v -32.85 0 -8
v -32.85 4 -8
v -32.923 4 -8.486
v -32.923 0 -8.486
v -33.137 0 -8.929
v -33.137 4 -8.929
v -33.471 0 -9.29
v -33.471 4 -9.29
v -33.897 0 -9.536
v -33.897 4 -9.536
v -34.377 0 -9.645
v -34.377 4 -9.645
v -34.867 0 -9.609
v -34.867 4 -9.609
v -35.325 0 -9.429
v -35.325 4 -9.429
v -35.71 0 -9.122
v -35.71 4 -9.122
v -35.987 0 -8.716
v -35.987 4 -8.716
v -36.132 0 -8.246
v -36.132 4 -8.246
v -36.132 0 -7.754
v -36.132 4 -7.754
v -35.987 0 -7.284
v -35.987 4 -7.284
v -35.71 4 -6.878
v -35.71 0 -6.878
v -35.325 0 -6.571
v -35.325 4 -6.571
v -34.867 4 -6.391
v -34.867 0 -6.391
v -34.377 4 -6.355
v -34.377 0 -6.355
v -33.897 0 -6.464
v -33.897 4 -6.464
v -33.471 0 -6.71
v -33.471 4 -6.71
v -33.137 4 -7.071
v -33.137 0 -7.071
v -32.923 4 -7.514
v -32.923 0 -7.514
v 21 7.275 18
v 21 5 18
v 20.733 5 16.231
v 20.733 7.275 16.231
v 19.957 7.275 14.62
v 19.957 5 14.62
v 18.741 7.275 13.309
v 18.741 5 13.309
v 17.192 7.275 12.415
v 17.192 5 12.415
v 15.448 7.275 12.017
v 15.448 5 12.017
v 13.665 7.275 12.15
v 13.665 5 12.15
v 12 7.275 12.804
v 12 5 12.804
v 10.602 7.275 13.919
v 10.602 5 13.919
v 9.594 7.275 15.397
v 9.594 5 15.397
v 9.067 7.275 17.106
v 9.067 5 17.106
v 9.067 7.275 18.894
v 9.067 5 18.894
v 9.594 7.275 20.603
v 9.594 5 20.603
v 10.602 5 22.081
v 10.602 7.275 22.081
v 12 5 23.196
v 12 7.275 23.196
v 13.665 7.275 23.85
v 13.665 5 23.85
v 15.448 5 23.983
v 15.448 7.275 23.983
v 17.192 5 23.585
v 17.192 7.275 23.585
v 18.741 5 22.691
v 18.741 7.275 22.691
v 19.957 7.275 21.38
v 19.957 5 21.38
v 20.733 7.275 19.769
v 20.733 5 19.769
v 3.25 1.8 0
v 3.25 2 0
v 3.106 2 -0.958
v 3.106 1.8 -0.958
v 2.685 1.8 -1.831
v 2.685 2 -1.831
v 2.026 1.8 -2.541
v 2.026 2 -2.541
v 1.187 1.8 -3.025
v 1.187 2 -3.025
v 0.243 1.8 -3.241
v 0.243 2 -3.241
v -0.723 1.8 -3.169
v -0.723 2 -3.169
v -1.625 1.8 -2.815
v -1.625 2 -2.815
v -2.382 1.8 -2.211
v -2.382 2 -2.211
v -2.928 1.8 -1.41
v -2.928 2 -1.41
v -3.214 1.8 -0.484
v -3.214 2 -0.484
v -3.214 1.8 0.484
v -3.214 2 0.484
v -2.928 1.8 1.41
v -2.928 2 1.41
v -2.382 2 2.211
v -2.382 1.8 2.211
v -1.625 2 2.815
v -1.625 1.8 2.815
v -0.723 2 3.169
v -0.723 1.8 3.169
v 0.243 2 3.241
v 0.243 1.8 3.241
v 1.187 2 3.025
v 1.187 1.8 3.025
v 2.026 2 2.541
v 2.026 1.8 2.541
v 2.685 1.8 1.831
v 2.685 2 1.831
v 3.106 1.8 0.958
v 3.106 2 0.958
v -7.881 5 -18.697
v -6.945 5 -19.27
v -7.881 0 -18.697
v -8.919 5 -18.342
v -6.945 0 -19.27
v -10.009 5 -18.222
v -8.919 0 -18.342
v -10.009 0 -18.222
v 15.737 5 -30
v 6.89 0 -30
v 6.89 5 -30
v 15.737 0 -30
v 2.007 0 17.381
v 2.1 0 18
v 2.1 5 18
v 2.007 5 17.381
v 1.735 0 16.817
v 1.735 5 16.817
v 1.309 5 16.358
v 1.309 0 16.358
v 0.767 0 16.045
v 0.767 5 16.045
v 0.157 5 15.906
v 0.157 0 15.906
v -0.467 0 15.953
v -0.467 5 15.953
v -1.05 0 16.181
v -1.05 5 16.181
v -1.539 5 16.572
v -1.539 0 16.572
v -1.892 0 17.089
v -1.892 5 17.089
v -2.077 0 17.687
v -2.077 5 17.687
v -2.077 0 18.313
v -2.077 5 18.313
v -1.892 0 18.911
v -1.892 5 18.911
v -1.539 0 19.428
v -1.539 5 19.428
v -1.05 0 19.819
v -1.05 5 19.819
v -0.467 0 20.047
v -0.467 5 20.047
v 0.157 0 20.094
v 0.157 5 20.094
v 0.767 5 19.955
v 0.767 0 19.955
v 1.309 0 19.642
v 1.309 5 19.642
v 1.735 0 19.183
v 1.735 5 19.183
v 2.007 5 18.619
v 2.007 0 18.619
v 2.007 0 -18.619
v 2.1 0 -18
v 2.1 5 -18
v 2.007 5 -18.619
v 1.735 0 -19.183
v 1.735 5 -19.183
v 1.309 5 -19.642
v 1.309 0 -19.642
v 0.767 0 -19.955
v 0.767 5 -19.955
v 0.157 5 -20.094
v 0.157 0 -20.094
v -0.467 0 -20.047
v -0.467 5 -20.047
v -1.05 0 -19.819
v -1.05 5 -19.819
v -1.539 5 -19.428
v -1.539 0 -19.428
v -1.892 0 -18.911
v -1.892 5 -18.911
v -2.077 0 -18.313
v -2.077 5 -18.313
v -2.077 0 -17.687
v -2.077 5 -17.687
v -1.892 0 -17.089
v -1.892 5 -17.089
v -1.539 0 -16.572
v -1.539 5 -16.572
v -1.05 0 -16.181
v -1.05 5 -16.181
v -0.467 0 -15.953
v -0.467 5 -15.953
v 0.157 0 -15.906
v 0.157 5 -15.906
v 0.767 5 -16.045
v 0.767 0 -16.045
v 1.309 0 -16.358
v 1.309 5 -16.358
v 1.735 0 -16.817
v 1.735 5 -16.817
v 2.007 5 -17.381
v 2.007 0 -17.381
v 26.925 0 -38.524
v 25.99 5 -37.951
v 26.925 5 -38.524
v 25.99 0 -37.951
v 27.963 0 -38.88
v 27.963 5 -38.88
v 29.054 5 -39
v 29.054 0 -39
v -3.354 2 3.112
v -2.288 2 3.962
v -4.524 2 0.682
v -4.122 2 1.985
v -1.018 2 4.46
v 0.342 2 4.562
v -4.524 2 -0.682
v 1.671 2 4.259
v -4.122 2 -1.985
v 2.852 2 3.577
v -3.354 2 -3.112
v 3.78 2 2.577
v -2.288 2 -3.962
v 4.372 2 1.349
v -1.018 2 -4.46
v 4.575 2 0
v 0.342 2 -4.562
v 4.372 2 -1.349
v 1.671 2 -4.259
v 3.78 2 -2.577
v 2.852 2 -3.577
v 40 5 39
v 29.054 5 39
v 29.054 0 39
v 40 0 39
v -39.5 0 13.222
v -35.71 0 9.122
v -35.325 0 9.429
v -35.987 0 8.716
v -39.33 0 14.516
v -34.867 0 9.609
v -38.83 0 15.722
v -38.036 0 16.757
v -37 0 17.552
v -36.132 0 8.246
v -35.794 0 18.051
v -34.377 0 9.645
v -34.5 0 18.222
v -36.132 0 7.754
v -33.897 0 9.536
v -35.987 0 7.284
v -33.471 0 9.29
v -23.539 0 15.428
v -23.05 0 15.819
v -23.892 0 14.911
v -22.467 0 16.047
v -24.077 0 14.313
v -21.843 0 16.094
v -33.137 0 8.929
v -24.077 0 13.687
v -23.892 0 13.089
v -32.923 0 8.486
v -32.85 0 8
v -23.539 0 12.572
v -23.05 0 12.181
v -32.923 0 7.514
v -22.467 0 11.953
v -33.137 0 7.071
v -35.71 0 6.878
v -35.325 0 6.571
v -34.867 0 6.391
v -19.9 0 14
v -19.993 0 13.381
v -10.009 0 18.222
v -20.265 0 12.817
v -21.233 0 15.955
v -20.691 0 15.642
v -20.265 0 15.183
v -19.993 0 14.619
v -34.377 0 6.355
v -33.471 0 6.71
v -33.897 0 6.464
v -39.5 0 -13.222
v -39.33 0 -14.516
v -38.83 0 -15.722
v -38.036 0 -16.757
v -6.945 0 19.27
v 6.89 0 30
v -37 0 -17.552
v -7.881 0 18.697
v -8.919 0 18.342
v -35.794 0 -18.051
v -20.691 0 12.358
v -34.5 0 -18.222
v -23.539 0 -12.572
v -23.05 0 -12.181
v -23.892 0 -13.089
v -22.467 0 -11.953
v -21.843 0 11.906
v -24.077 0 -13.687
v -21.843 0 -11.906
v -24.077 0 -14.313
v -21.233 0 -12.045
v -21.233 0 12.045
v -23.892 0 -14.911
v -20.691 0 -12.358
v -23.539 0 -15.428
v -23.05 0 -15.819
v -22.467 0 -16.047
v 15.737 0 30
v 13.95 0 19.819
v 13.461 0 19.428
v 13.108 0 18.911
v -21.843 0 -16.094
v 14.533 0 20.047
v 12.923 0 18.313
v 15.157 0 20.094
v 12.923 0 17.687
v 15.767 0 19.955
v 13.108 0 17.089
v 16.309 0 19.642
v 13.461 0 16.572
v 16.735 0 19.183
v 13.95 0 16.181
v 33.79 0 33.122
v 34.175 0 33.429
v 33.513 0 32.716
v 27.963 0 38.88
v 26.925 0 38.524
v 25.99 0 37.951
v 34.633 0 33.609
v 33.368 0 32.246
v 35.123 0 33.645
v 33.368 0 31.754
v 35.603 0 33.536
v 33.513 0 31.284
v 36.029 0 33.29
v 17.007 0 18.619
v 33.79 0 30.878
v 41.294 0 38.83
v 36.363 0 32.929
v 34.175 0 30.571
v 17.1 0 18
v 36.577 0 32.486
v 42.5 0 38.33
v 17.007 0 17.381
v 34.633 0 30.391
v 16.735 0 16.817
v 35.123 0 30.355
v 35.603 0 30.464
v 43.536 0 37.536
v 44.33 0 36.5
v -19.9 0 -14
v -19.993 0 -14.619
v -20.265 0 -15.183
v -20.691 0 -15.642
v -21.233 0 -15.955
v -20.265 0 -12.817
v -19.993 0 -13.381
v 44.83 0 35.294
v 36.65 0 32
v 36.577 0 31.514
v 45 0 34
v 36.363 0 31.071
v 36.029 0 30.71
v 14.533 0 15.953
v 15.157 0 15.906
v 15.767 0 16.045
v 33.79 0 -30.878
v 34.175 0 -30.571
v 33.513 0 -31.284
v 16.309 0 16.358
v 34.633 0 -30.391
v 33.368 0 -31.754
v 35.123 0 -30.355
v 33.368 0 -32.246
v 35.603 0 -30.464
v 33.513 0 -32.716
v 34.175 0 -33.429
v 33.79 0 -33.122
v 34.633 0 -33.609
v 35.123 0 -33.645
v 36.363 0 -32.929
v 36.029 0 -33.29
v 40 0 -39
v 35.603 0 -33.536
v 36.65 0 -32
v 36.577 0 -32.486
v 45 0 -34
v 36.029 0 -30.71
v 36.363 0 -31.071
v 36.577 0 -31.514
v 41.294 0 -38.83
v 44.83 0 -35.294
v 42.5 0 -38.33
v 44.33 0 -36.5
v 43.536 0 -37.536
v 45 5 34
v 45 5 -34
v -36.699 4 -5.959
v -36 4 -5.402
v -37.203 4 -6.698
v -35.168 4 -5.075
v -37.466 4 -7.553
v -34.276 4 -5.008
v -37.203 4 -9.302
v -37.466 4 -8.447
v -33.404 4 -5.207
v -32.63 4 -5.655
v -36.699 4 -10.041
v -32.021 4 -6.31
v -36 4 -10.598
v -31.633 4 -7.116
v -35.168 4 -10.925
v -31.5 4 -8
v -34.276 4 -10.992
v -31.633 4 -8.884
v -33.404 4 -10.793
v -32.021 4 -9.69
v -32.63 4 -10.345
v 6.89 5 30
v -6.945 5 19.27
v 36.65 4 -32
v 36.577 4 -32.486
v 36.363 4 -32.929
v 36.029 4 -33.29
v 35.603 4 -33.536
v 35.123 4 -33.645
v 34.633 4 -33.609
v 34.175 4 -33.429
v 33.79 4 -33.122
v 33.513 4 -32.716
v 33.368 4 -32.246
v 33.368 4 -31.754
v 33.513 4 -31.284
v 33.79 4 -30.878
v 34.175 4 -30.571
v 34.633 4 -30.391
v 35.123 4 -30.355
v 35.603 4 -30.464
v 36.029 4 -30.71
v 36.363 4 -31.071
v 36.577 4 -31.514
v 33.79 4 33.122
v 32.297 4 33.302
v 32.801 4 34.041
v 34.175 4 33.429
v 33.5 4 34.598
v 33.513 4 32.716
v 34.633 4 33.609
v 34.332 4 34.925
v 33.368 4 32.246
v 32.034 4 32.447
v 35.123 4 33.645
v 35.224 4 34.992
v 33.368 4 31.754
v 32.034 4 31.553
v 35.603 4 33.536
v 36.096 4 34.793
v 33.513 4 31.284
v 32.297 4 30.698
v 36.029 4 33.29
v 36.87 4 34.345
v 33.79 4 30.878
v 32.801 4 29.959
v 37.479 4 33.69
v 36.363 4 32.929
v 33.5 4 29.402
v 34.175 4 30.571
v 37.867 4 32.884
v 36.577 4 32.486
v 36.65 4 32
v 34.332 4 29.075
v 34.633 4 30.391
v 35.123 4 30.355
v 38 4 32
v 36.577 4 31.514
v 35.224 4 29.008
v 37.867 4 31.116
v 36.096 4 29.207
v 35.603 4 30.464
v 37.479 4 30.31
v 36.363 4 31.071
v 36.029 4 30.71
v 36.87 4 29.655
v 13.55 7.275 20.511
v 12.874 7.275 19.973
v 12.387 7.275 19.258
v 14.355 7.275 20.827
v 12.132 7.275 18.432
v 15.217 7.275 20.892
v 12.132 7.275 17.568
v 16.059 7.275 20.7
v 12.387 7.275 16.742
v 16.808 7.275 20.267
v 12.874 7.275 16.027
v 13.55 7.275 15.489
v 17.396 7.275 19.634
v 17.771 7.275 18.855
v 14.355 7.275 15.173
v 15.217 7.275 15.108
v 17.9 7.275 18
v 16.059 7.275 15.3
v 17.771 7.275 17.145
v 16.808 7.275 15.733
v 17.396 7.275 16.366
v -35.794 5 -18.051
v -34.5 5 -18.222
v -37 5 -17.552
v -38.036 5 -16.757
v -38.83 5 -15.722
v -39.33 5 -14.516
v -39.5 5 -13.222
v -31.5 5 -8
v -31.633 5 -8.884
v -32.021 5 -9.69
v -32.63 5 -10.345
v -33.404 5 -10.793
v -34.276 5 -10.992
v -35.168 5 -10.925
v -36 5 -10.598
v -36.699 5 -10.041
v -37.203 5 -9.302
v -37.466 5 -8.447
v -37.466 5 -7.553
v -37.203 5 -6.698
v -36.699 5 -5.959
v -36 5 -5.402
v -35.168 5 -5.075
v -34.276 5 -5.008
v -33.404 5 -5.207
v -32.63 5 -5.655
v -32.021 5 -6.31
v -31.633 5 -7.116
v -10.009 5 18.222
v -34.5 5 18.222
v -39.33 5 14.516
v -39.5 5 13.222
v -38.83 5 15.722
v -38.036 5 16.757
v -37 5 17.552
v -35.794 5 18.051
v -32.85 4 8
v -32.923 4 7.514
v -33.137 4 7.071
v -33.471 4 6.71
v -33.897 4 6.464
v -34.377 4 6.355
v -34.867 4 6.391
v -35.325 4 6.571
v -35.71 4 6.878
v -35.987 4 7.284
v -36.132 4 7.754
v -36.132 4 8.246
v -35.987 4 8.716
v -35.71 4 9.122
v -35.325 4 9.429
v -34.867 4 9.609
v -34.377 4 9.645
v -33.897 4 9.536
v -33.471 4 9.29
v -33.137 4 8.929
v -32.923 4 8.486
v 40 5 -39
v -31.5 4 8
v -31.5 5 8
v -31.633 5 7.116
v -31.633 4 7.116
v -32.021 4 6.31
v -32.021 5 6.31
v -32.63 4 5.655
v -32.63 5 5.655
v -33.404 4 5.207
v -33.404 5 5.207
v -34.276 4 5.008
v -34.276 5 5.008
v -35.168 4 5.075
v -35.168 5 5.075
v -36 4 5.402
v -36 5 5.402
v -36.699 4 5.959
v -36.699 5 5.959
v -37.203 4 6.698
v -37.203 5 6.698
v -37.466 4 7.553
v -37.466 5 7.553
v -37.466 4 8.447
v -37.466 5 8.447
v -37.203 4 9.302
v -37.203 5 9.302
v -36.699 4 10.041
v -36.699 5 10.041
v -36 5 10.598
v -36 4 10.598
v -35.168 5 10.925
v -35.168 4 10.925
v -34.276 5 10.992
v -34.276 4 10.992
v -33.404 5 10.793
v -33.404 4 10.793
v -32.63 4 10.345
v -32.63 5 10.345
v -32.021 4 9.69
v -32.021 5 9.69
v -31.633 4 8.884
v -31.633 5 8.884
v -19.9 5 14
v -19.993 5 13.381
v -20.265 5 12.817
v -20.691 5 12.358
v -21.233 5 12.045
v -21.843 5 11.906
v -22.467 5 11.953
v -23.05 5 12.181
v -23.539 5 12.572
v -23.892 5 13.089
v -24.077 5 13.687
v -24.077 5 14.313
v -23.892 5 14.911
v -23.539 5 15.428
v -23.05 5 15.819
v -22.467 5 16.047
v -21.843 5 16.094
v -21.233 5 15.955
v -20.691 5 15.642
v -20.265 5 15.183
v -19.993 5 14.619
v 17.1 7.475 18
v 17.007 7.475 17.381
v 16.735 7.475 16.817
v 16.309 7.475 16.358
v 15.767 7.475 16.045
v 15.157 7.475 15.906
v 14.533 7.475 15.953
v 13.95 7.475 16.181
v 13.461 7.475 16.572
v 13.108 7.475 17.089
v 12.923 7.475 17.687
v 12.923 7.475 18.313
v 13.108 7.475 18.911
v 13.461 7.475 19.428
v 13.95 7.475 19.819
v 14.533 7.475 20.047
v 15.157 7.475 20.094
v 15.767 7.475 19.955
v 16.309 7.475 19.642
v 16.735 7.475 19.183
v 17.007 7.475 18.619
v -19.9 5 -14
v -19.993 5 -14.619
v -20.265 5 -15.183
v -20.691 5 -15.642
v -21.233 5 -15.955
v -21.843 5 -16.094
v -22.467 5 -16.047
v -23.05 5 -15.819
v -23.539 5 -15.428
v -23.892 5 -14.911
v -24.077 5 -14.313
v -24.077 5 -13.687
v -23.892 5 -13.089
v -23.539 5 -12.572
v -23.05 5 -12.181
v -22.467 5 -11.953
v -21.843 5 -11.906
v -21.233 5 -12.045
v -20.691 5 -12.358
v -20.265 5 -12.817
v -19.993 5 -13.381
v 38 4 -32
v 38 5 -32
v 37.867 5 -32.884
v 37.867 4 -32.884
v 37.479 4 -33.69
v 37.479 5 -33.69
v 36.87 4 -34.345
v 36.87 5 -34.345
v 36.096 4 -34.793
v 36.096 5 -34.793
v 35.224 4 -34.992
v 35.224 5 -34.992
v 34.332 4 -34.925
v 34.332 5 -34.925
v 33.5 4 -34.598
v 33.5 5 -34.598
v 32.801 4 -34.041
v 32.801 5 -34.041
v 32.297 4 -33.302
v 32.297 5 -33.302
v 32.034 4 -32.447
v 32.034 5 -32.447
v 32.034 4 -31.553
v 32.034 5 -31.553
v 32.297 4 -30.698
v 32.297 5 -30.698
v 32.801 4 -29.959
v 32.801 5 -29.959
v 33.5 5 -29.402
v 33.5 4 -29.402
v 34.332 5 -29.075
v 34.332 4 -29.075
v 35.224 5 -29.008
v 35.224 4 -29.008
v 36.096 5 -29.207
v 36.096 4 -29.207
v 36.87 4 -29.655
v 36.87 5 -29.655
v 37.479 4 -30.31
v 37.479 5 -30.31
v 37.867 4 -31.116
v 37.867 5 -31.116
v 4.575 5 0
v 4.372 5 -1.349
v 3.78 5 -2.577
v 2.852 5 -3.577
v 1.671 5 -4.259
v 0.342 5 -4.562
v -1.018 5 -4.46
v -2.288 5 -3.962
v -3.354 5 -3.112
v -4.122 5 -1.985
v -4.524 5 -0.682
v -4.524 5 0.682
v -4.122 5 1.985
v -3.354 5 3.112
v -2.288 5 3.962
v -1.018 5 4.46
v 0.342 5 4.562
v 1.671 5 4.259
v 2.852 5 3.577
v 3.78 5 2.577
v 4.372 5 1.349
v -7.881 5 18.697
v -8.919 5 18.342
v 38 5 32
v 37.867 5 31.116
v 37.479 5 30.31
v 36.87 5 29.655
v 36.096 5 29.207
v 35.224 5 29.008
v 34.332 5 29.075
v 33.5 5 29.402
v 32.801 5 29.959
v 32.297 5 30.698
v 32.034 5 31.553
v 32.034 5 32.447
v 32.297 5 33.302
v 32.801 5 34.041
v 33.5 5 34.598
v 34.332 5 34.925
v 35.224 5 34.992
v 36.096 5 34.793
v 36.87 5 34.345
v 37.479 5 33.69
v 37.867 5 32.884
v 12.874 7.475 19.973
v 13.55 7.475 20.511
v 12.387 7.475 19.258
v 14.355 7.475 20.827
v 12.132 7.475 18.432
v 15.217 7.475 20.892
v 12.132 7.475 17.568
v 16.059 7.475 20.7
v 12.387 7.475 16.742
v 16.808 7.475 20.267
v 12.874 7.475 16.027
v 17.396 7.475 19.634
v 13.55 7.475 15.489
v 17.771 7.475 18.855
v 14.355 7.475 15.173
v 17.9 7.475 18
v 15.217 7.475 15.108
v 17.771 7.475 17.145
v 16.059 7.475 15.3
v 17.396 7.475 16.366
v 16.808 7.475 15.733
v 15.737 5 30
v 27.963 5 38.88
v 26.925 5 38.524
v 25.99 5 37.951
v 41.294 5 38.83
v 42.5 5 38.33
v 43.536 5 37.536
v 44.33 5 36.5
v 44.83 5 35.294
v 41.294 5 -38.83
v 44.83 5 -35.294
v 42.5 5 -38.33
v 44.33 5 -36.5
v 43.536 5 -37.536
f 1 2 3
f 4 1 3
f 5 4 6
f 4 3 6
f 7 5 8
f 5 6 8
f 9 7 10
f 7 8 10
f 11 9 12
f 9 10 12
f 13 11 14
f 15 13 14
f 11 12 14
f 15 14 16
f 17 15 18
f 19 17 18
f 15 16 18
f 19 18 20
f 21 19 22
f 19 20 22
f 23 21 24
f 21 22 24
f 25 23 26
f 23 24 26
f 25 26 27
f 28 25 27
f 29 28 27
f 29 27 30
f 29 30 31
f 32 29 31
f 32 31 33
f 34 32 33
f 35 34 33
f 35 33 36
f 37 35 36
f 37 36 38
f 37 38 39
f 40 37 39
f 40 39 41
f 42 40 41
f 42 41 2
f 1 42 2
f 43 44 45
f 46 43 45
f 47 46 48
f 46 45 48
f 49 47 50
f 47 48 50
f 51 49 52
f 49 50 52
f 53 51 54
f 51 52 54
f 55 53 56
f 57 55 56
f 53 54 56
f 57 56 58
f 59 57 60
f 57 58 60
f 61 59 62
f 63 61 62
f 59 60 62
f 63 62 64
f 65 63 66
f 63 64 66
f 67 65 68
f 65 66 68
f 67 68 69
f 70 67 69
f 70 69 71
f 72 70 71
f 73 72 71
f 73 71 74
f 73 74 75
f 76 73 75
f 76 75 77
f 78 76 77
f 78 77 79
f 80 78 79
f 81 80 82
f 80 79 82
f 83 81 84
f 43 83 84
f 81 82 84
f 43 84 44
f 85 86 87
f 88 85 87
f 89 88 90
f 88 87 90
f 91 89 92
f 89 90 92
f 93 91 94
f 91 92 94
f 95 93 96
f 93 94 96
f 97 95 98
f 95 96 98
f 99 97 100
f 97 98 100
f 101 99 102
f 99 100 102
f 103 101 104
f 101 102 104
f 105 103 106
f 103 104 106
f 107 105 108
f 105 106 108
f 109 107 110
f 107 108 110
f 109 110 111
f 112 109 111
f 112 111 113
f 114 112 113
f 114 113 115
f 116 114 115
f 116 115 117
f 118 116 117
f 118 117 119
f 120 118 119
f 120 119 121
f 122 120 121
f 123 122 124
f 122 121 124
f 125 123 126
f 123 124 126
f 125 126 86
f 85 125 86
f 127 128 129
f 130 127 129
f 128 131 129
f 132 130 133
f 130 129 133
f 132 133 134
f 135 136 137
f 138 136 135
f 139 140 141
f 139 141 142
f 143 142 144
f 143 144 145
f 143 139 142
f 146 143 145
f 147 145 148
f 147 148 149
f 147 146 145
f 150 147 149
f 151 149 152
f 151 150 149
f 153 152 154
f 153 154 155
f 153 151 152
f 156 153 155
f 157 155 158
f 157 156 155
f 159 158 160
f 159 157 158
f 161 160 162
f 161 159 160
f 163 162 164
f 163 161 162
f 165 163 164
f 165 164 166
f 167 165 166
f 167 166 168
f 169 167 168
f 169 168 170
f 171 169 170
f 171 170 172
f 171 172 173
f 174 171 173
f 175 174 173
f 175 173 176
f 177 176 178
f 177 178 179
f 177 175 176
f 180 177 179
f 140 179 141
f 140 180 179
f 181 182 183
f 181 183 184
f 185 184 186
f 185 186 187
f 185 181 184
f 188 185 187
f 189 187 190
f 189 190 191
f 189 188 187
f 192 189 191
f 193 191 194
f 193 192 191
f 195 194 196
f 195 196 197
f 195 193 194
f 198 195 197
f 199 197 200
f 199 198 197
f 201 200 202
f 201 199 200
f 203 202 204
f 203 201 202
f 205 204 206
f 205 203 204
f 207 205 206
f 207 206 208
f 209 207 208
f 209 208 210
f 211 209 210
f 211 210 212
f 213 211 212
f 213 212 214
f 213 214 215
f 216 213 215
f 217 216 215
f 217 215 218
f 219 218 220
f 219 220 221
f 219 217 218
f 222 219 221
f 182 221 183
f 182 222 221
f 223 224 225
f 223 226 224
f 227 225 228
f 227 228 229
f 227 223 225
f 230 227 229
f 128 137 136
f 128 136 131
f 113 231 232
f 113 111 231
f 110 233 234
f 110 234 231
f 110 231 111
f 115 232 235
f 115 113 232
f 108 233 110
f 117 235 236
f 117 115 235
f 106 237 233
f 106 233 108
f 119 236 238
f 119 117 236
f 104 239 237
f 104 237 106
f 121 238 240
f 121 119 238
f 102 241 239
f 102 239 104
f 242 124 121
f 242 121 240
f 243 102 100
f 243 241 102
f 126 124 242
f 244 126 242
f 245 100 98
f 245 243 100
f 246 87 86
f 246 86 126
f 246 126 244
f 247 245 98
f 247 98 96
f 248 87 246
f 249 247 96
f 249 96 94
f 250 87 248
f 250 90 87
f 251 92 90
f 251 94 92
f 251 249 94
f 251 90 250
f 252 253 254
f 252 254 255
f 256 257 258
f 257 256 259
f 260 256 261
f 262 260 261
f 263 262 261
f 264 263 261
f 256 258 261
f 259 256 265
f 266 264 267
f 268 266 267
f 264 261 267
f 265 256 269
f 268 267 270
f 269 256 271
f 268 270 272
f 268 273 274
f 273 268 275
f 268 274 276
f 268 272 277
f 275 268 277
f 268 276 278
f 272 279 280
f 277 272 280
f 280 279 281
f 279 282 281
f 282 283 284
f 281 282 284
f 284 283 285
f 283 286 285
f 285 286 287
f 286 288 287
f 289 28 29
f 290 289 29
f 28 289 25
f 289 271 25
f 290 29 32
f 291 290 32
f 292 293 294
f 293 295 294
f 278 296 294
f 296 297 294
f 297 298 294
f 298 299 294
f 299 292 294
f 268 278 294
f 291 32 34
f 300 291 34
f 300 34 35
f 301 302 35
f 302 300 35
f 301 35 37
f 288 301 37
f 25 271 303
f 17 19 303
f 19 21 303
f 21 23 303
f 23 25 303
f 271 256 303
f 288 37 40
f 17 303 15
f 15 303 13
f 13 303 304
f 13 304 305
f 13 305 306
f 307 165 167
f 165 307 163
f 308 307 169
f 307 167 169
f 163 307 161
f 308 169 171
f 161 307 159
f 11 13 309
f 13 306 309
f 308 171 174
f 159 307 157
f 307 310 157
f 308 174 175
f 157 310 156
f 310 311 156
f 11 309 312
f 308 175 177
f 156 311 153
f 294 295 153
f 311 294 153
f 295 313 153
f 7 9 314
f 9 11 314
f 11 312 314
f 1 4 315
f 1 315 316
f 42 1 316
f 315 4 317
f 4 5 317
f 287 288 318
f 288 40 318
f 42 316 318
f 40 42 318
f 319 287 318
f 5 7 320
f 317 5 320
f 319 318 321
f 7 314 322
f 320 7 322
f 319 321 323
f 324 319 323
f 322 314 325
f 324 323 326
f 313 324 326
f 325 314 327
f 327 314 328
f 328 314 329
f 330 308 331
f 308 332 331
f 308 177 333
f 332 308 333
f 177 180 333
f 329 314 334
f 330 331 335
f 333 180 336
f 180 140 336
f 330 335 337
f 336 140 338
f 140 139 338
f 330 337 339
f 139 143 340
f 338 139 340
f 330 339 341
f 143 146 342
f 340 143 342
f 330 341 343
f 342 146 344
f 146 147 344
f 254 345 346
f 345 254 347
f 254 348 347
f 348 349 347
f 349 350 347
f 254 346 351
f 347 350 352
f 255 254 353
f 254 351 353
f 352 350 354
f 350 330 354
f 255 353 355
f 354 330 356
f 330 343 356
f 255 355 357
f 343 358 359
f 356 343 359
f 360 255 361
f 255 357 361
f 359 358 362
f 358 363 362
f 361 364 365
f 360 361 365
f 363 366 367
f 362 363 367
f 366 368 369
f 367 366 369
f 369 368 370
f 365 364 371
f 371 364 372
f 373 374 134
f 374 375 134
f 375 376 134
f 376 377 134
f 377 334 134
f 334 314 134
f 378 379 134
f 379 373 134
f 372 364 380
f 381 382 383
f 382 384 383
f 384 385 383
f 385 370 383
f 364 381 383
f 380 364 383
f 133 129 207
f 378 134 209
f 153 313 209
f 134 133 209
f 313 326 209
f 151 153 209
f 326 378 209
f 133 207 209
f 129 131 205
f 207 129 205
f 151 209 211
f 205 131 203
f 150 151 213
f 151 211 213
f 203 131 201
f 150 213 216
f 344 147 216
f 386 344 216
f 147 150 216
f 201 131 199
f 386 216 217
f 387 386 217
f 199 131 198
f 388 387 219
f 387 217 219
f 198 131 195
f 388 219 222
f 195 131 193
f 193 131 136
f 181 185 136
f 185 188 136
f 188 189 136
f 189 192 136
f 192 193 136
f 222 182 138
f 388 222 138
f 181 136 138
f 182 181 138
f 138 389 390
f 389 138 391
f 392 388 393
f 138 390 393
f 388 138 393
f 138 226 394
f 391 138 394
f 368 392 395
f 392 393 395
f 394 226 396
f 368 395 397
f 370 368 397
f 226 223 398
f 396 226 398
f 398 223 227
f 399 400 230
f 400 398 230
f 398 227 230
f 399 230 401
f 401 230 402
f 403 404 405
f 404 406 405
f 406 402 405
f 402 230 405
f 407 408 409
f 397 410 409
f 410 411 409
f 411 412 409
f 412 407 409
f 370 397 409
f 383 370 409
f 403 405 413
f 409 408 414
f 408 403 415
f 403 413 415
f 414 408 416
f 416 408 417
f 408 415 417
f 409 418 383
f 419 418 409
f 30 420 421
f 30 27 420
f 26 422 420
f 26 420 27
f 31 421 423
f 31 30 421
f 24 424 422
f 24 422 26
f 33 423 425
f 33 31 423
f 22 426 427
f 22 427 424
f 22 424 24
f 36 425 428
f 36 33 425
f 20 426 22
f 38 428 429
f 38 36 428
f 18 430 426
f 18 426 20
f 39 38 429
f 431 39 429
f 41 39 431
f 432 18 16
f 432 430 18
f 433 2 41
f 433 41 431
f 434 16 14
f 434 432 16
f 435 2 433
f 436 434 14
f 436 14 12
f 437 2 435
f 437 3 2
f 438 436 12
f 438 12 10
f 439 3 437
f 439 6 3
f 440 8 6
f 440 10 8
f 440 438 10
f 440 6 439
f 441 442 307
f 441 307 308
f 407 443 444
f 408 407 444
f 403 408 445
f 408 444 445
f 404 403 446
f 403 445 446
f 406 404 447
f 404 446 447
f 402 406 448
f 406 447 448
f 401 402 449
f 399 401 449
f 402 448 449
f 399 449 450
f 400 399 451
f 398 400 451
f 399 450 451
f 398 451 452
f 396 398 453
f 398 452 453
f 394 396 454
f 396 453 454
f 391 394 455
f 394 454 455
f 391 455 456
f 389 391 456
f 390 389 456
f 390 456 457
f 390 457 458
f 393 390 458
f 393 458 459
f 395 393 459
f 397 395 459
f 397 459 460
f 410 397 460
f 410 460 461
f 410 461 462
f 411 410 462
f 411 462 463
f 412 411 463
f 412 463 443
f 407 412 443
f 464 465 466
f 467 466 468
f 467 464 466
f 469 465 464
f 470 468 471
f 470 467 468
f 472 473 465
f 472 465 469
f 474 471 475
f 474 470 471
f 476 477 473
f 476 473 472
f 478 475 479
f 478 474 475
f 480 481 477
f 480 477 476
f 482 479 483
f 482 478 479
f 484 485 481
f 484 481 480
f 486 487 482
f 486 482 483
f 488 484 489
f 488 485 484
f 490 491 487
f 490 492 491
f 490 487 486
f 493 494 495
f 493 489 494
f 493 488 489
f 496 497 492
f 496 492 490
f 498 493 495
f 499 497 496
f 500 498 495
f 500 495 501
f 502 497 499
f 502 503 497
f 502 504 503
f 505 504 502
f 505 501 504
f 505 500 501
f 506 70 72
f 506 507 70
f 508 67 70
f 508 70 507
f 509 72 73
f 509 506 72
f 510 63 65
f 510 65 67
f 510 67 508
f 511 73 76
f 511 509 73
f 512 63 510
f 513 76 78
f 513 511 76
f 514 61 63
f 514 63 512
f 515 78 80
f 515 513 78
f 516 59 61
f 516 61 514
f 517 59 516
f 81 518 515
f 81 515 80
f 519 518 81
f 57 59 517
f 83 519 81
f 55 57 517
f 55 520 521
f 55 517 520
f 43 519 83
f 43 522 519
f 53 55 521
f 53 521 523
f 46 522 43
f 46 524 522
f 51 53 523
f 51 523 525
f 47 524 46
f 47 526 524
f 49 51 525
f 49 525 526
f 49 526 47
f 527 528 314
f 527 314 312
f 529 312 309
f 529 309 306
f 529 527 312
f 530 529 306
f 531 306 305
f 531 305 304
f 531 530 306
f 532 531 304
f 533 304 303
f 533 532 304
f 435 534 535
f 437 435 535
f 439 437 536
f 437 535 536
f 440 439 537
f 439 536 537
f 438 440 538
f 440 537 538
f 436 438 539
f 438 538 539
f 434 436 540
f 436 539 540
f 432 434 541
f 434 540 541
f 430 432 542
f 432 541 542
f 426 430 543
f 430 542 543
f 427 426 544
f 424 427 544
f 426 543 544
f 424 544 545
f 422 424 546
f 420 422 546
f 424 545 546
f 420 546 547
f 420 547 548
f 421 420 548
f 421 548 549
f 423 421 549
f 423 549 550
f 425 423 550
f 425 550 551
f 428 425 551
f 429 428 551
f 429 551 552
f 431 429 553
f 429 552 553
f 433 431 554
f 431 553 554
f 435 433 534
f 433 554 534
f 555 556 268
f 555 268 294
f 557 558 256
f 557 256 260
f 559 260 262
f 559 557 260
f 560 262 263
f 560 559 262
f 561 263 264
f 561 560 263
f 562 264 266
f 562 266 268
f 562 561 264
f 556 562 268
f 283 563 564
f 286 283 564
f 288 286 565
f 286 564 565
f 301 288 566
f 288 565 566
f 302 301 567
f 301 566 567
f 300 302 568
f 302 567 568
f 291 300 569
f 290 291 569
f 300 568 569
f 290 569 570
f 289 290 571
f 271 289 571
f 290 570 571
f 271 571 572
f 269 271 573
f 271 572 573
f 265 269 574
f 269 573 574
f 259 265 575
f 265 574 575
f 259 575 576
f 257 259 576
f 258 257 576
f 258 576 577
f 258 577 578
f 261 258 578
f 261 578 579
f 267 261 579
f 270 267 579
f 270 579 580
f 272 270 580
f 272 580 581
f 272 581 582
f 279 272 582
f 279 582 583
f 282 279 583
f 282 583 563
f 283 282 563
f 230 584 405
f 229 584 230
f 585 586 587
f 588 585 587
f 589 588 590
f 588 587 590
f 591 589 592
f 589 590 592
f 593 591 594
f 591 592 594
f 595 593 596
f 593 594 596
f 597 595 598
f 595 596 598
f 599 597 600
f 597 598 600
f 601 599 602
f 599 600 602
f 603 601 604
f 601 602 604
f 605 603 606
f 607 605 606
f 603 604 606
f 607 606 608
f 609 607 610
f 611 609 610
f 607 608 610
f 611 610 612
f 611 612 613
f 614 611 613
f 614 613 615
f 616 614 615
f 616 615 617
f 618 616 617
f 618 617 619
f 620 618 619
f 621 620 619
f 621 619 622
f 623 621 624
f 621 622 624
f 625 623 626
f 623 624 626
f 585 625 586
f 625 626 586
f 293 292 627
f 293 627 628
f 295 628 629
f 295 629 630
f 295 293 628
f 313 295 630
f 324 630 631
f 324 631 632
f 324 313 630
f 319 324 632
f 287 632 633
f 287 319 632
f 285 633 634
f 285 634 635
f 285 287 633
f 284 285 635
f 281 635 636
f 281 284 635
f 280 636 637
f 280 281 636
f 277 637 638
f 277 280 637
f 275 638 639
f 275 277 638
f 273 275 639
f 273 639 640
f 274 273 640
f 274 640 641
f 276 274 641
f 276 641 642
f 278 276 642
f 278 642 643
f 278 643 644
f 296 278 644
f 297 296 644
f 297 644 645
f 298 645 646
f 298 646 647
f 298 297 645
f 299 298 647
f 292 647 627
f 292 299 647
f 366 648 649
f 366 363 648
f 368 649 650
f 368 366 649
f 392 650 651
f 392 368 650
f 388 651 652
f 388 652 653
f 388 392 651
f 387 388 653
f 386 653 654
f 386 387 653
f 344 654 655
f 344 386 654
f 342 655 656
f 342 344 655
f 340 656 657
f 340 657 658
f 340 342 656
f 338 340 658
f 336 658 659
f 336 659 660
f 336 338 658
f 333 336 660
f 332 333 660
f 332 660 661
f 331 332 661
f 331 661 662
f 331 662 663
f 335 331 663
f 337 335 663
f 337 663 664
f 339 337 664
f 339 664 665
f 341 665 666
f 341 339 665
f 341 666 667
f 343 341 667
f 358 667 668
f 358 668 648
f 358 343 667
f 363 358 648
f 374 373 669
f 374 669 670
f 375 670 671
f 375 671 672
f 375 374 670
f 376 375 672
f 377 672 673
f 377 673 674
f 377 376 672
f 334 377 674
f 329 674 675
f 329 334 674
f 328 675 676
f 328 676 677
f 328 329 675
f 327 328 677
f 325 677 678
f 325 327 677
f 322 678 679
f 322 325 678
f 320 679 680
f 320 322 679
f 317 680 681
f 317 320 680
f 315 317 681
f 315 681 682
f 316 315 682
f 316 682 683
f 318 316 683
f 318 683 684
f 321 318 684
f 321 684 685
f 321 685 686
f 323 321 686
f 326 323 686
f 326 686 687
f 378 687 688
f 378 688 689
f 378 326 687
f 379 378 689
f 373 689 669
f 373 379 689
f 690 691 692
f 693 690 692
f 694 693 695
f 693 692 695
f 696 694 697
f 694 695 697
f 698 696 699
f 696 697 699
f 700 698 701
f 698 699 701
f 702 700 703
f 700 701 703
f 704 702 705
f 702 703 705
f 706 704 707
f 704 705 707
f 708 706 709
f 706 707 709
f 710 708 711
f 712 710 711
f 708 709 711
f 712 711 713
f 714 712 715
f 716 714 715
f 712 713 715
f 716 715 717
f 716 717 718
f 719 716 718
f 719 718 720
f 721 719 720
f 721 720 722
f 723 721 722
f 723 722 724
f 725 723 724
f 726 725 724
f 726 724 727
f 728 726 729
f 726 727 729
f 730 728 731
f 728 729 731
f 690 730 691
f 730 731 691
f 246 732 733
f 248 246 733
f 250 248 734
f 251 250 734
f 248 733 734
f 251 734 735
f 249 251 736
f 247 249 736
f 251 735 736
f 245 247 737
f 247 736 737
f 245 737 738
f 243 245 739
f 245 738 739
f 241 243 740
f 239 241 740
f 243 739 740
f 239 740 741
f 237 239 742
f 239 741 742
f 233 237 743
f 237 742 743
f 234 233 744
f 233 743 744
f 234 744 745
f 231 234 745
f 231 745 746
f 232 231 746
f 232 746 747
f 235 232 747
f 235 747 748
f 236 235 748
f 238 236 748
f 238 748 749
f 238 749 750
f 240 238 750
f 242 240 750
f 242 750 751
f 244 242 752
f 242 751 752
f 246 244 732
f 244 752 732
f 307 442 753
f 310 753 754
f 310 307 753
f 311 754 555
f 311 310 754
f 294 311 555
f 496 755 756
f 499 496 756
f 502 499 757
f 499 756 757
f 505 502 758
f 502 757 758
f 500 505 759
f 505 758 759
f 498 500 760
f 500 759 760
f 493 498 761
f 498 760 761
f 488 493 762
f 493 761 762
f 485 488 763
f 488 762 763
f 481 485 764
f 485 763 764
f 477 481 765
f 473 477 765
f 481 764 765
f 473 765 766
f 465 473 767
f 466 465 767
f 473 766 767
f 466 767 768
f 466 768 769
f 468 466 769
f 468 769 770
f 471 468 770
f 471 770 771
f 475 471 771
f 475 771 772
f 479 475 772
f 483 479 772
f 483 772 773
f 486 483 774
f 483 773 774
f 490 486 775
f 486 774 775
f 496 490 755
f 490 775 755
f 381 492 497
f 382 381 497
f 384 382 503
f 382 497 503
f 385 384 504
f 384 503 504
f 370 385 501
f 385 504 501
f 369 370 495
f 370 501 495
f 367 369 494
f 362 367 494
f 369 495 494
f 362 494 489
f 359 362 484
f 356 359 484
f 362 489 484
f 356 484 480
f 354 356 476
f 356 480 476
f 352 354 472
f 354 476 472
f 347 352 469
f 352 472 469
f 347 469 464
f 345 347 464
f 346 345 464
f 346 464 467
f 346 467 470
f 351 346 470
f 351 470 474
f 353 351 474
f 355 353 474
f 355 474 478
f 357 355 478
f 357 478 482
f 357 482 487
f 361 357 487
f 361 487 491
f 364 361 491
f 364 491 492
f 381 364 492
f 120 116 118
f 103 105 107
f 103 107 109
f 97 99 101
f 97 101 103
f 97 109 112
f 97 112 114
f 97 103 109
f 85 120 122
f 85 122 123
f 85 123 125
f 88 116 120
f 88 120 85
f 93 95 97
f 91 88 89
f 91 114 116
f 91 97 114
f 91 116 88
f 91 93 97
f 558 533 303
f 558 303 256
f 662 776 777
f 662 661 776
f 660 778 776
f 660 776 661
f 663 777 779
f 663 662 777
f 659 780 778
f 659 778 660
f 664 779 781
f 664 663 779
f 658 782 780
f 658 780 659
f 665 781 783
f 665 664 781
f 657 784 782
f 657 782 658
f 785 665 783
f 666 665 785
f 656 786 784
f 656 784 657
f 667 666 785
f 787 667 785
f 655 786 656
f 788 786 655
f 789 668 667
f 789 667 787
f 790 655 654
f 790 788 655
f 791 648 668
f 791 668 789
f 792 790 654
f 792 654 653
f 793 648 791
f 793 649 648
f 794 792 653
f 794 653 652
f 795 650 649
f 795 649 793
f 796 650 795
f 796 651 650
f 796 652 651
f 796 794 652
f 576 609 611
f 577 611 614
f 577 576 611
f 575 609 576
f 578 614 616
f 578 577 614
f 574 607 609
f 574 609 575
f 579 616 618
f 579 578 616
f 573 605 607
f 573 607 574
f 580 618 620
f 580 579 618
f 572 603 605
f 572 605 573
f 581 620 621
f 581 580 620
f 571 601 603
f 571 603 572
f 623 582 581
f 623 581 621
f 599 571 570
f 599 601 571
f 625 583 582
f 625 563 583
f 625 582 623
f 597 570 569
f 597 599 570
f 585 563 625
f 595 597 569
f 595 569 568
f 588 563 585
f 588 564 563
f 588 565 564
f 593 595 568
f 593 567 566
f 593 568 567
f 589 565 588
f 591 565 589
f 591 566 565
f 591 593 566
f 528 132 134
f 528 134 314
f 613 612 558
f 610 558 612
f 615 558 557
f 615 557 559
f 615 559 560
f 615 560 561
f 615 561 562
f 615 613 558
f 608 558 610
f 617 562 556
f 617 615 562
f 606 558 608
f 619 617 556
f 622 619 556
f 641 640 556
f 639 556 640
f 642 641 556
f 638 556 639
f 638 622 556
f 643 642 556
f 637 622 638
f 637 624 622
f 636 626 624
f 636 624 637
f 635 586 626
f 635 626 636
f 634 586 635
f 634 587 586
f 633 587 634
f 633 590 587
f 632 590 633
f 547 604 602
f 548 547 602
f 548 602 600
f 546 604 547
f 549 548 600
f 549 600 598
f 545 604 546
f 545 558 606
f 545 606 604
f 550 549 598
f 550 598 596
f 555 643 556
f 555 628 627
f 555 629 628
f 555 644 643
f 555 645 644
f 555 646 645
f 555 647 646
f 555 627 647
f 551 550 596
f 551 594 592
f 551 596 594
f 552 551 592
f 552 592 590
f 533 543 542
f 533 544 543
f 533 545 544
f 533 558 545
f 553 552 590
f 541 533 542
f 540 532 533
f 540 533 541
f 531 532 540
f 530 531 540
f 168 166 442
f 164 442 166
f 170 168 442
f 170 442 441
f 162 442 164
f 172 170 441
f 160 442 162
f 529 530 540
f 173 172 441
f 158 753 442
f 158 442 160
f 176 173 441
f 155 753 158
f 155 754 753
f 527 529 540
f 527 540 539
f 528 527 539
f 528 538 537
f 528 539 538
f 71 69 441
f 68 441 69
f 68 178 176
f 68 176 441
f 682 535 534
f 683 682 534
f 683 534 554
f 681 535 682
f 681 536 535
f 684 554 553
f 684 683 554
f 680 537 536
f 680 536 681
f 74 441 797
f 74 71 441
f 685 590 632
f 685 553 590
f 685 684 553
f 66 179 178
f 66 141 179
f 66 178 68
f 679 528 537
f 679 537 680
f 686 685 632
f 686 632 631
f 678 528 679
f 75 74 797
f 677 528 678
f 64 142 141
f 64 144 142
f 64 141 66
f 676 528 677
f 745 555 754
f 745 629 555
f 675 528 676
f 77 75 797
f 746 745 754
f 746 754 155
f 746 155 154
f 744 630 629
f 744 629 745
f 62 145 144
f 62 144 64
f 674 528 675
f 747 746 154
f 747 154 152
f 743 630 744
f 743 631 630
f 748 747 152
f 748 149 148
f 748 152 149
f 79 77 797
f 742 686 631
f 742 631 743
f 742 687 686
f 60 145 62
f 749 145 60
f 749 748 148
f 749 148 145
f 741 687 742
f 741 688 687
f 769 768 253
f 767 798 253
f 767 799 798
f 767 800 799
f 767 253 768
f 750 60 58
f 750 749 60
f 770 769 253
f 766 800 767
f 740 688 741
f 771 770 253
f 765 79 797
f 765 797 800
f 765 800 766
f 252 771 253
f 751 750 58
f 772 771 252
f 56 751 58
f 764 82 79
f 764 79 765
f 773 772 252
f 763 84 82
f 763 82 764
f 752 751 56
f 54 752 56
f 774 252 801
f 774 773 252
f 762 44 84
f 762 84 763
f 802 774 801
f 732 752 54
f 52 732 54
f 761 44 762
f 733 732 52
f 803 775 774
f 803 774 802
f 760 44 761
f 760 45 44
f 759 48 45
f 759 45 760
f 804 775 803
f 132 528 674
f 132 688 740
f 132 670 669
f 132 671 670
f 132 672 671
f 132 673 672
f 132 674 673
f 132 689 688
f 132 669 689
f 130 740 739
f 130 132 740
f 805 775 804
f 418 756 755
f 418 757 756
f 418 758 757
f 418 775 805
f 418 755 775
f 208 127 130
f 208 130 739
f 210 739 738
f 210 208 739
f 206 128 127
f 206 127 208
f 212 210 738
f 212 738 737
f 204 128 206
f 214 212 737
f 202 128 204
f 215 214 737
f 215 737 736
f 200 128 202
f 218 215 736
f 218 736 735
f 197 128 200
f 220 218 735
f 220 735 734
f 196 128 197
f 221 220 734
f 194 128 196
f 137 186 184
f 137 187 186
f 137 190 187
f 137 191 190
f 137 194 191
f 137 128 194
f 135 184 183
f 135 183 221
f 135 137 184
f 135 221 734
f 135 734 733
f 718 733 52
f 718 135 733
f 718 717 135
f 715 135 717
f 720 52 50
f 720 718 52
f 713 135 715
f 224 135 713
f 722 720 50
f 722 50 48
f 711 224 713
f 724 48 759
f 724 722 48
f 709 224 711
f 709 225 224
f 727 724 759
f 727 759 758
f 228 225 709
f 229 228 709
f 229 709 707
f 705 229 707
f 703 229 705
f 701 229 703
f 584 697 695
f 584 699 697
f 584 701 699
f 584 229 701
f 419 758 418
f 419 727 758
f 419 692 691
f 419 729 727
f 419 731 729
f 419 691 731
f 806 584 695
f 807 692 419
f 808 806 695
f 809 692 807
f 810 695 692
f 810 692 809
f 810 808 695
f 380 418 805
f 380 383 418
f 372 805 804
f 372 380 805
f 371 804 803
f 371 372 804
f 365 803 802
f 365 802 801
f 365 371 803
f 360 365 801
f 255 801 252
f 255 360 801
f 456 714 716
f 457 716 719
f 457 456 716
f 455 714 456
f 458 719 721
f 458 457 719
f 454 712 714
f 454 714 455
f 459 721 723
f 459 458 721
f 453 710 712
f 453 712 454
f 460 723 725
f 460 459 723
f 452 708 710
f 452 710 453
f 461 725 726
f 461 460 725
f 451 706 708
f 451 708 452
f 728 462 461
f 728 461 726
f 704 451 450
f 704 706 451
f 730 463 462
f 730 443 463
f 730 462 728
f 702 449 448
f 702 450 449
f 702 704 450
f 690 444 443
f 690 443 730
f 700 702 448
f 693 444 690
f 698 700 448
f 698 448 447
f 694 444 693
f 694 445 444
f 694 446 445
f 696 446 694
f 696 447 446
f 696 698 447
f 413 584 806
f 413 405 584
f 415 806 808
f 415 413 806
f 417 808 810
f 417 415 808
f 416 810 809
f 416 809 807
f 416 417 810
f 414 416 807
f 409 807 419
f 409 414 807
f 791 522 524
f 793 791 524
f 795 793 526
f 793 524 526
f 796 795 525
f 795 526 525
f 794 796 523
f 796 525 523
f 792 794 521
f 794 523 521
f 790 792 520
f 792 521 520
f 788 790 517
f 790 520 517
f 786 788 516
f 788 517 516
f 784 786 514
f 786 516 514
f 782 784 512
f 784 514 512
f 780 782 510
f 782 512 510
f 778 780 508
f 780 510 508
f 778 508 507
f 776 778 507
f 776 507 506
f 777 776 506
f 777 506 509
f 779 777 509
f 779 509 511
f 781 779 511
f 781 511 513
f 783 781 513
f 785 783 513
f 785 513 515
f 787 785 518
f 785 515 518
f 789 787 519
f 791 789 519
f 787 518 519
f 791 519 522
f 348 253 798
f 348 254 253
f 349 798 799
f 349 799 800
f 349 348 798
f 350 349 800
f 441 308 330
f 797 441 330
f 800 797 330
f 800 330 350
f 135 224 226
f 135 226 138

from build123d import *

# Parameters (mm, degrees)
SKETCH1_W           = 115
SKETCH1_H           = 60
SKETCH1_R           = 2.1
BOSS_EXTRUDE1_DEPTH = 5
SKETCH2_R           = 4.575
CUT_EXTRUDE1_DEPTH  = 3
SKETCH3_R           = 3.25
CUT_EXTRUDE2_DEPTH  = 0.2
SKETCH4_R           = 1.65
CUT_EXTRUDE3_DEPTH  = 6
CUT_EXTRUDE4_DEPTH  = 6
BOSS_EXTRUDE2_DEPTH = 5
SKETCH8_R           = 1.65
CUT_EXTRUDE5_DEPTH  = 6
FILLET1_R           = 5
SKETCH9_R           = 6
SKETCH9_R_2         = 2.1
BOSS_EXTRUDE3_DEPTH = 2.275
SKETCH10_R          = 2.9
SKETCH10_R_2        = 2.1
BOSS_EXTRUDE4_DEPTH = 0.2
SKETCH11_R          = 3
CUT_EXTRUDE6_DEPTH  = 1


with BuildPart() as part:
    # Sketch1 → Boss-Extrude1 (new body)
    with BuildSketch(Plane(origin=(0, 0, 0), x_dir=(1, 0, 0), z_dir=(0, 1, 0))):
        with Locations((-12.5, 0)):
            Rectangle(SKETCH1_W, SKETCH1_H)
        with Locations((-22, 14)):
            Circle(SKETCH1_R, mode=Mode.SUBTRACT)
        with Locations((0, 18)):
            Circle(SKETCH1_R, mode=Mode.SUBTRACT)
        with Locations((0, -18)):
            Circle(SKETCH1_R, mode=Mode.SUBTRACT)
        with Locations((-22, -14)):
            Circle(SKETCH1_R, mode=Mode.SUBTRACT)
        with Locations((15, -18)):
            Circle(SKETCH1_R, mode=Mode.SUBTRACT)
    extrude(amount=BOSS_EXTRUDE1_DEPTH)

    # Sketch2 → Cut-Extrude1 (cut)
    with BuildSketch(Plane(origin=(0, 5, 0), x_dir=(1, 0, 0), z_dir=(0, 1, 0))):
        Circle(SKETCH2_R)
    extrude(amount=-CUT_EXTRUDE1_DEPTH, mode=Mode.SUBTRACT)

    # Sketch3 → Cut-Extrude2 (cut)
    with BuildSketch(Plane(origin=(0, 2, 0), x_dir=(1, 0, 0), z_dir=(0, 1, 0))):
        Circle(SKETCH3_R)
    extrude(amount=-CUT_EXTRUDE2_DEPTH, mode=Mode.SUBTRACT)

    # Sketch4 → Cut-Extrude3 (cut, through all)
    with BuildSketch(Plane(origin=(0, 5, 0), x_dir=(1, 0, 0), z_dir=(0, 1, 0))):
        with Locations((-34.5, -8)):
            Circle(SKETCH4_R)
        with Locations((-34.5, 8)):
            Circle(SKETCH4_R)
    extrude(amount=-CUT_EXTRUDE3_DEPTH, mode=Mode.SUBTRACT)

    # Sketch6 → Cut-Extrude4 (cut, through all)
    with BuildSketch(Plane(origin=(0, 5, 0), x_dir=(1, 0, 0), z_dir=(0, 1, 0))):
        with BuildLine():
            Line((-22, 18.221576202), (-34.5, 18.221576202))
            ThreePointArc((-34.5, 18.221576202), (-38.035533906, 16.757110108), (-39.5, 13.221576202))
            Line((-39.5, 13.221576202), (-39.5, -13.221576202))
            ThreePointArc((-39.5, -13.221576202), (-38.035533906, -16.757110108), (-34.5, -18.221576202))
            Line((-34.5, -18.221576202), (-22, -18.221576202))
            Line((-22, -18.221576202), (-8.297519941, -18.221576202))
            Line((-8.297519941, -18.221576202), (14.635521586, -36.006383916))
            Line((14.635521586, -36.006383916), (-22, -30))
            Line((-22, -30), (-70, -30))
            Line((-70, -30), (-70, 30))
            Line((-70, 30), (-22, 30))
            Line((-22, 30), (16.094767965, 37.138044373))
            Line((16.094767965, 37.138044373), (-8.297519941, 18.221576202))
            Line((-8.297519941, 18.221576202), (-22, 18.221576202))
        make_face()
    extrude(amount=-CUT_EXTRUDE4_DEPTH, mode=Mode.SUBTRACT)

    # Sketch7 → Boss-Extrude2 (add)
    with BuildSketch(Plane(origin=(0, 5, 0), x_dir=(1, 0, 0), z_dir=(0, 1, 0))):
        Polygon((27.342211368, 39), (15.73694821, 30), (45, 30), (45, 39), align=None)
        Polygon((45, -30), (15.73694821, -30), (27.342211368, -39), (45, -39), align=None)
    extrude(amount=-BOSS_EXTRUDE2_DEPTH)

    # Sketch8 → Cut-Extrude5 (cut, through all)
    with BuildSketch(Plane(origin=(0, 5, 0), x_dir=(1, 0, 0), z_dir=(0, 1, 0))):
        with Locations((35, 32)):
            Circle(SKETCH8_R)
        with Locations((35, -32)):
            Circle(SKETCH8_R)
    extrude(amount=-CUT_EXTRUDE5_DEPTH, mode=Mode.SUBTRACT)

    # Fillet1
    fillet1_edges = [part.edges().sort_by_distance(p)[0] for p in [
        (45, 2.5, -39),
        (27.342211368, 2.5, -39),
        (27.342211368, 2.5, 39),
        (45, 2.5, 39),
        (-8.297519941, 2.5, 18.221576202),
        (-8.297519941, 2.5, -18.221576202),
    ]]
    fillet(fillet1_edges, radius=FILLET1_R)

    # Sketch9 → Boss-Extrude3 (add)
    with BuildSketch(Plane(origin=(0, 5, 0), x_dir=(1, 0, 0), z_dir=(0, 1, 0))):
        with Locations((15, -18)):
            Circle(SKETCH9_R)
        with Locations((15, -18)):
            Circle(SKETCH9_R_2, mode=Mode.SUBTRACT)
    extrude(amount=BOSS_EXTRUDE3_DEPTH)

    # Sketch10 → Boss-Extrude4 (add)
    with BuildSketch(Plane(origin=(0, 7.275, 0), x_dir=(1, 0, 0), z_dir=(0, 1, 0))):
        with Locations((15, -18)):
            Circle(SKETCH10_R)
        with Locations((15, -18)):
            Circle(SKETCH10_R_2, mode=Mode.SUBTRACT)
    extrude(amount=BOSS_EXTRUDE4_DEPTH)

    # Sketch11 → Cut-Extrude6 (cut)
    with BuildSketch(Plane(origin=(0, 5, 0), x_dir=(1, 0, 0), z_dir=(0, 1, 0))):
        with Locations((-34.5, 8)):
            Circle(SKETCH11_R)
        with Locations((-34.5, -8)):
            Circle(SKETCH11_R)
        with Locations((35, -32)):
            Circle(SKETCH11_R)
        with Locations((35, 32)):
            Circle(SKETCH11_R)
    extrude(amount=-CUT_EXTRUDE6_DEPTH, mode=Mode.SUBTRACT)


solid = part.part
